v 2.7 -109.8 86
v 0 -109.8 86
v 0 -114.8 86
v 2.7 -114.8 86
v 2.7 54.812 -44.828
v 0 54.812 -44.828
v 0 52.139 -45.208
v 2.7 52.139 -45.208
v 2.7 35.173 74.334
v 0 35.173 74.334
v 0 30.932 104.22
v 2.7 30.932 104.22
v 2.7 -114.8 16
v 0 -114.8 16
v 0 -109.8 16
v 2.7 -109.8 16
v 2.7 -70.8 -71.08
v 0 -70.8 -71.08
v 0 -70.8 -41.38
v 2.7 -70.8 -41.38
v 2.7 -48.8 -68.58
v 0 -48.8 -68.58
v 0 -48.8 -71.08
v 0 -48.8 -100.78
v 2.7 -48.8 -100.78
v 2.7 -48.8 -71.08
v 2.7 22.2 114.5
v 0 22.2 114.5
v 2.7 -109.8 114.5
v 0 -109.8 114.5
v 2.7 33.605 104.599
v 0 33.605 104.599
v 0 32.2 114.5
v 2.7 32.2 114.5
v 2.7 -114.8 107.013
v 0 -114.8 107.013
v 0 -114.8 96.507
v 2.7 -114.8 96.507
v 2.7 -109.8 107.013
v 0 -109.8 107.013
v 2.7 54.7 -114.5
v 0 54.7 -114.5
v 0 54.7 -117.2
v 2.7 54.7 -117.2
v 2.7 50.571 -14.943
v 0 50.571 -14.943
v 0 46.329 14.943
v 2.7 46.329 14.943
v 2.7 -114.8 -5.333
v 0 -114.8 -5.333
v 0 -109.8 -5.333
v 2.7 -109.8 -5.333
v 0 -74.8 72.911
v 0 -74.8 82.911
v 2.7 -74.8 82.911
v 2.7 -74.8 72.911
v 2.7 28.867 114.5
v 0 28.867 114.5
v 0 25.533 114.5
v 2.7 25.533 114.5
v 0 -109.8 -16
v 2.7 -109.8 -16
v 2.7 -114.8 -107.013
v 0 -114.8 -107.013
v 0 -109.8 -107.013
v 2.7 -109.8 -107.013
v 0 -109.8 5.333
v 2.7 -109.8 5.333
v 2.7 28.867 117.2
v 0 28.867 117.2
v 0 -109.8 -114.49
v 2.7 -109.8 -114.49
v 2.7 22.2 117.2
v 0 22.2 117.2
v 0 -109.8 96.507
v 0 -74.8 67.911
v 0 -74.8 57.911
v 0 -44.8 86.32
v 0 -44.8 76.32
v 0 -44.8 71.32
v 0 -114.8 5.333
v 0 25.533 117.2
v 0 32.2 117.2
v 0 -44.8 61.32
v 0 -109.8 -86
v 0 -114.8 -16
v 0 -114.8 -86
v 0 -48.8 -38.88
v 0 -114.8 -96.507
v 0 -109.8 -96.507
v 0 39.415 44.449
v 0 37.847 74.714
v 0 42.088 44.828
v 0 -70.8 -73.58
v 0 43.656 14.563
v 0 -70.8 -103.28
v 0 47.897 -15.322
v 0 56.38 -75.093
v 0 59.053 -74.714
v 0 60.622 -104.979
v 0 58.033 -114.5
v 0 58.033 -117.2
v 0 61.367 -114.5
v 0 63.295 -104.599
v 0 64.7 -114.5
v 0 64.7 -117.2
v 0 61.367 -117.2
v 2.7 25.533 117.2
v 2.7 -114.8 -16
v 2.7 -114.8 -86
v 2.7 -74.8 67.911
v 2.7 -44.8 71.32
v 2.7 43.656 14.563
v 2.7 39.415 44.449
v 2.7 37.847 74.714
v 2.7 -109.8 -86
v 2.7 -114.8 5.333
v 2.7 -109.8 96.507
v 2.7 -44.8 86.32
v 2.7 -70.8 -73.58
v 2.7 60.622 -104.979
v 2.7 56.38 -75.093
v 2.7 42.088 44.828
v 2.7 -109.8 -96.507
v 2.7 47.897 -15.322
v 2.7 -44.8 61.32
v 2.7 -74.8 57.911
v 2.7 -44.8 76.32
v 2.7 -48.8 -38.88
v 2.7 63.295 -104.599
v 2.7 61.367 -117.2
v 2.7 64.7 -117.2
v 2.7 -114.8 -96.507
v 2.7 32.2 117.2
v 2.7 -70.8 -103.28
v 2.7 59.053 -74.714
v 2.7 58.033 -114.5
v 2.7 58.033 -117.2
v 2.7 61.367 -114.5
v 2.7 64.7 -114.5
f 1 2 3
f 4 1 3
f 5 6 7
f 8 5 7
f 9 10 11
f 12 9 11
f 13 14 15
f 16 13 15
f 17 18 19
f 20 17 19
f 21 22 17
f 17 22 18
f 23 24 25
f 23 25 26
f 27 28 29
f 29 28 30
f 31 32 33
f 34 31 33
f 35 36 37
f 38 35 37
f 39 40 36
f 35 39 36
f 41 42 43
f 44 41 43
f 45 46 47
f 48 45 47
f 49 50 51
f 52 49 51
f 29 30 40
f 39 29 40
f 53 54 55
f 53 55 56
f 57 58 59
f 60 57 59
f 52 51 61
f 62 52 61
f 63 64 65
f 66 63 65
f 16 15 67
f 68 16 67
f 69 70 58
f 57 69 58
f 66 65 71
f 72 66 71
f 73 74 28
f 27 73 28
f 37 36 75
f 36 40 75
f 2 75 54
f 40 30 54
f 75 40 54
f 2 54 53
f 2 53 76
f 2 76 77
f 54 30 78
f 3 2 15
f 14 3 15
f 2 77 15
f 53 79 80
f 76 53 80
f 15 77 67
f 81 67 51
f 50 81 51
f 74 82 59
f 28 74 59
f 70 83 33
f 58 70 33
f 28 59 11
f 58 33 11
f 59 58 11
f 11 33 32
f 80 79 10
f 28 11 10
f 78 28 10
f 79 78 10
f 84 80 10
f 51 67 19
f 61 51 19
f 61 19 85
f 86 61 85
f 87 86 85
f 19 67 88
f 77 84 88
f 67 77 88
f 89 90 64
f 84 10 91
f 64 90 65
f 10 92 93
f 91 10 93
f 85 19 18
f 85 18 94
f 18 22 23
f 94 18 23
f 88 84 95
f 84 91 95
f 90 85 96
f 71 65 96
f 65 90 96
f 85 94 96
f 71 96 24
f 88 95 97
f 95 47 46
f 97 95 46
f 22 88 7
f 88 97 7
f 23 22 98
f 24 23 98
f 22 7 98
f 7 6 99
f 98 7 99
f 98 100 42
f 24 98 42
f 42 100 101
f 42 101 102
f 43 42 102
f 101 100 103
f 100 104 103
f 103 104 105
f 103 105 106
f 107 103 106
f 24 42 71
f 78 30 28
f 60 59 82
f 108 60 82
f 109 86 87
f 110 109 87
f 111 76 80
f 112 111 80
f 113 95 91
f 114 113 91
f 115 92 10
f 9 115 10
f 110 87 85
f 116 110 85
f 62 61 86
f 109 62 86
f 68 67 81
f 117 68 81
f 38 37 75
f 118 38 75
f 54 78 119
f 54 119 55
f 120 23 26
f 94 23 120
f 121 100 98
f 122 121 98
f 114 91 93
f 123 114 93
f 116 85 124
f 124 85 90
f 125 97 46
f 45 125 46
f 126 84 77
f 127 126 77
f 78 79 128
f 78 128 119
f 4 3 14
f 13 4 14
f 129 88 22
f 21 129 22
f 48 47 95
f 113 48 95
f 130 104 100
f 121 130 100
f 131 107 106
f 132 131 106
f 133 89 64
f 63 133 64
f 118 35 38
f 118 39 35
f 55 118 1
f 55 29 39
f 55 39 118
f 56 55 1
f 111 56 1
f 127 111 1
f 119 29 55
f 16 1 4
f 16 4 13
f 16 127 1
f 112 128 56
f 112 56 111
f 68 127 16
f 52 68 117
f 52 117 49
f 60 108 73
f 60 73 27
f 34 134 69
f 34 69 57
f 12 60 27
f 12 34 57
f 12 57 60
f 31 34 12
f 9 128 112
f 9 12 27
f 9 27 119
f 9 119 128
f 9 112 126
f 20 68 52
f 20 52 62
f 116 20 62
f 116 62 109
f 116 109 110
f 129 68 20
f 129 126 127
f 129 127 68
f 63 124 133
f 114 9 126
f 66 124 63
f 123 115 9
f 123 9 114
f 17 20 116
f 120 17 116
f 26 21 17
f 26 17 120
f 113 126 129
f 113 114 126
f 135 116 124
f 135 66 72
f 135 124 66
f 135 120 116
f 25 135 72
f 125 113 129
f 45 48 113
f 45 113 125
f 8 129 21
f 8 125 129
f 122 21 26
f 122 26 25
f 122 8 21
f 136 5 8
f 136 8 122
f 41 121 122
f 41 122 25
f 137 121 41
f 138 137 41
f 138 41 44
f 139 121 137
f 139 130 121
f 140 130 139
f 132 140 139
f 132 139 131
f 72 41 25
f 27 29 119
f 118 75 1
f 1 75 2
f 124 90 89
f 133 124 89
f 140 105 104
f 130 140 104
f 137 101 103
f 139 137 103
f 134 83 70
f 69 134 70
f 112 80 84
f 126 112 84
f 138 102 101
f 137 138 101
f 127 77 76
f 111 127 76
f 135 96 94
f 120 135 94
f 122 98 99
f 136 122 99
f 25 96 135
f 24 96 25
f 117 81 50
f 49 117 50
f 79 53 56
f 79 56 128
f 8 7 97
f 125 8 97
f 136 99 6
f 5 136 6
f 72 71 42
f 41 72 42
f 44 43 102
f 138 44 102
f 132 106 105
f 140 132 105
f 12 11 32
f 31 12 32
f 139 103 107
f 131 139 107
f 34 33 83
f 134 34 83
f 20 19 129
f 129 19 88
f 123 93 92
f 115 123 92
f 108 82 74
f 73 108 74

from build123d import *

# Parameters (mm, degrees)
BOSS_EXTRUDE1_DEPTH = 2.7


with BuildPart() as part:
    # Sketch1 → Boss-Extrude1 (new body)
    with BuildSketch(Plane(origin=(0, 0, 0), x_dir=(0, 0, -1), z_dir=(1, 0, 0))):
        Polygon((-107.013333333, -114.8), (-96.506666667, -114.8), (-96.506666667, -109.8), (-86, -109.8), (-86, -114.8), (-16, -114.8), (-16, -109.8), (-5.333333333, -109.8), (-5.333333333, -114.8), (5.333333333, -114.8), (5.333333333, -109.8), (16, -109.8), (16, -114.8), (86, -114.8), (86, -109.8), (96.506666667, -109.8), (96.506666667, -114.8), (107.013333333, -114.8), (107.013333333, -109.8), (114.49, -109.8), (114.5, 54.7), (117.2, 54.7), (117.2, 58.033333333), (114.5, 58.033333333), (114.5, 61.366666667), (117.2, 61.366666667), (117.2, 64.7), (114.5, 64.7), (104.599212181, 63.294866357), (104.978598264, 60.621653646), (75.09310907, 56.380263258), (74.713722986, 59.05347597), (44.828233792, 54.812085582), (45.207619875, 52.138872871), (15.322130681, 47.897482483), (14.942744597, 50.570695194), (-14.942744597, 46.329304806), (-14.563358514, 43.656092095), (-44.448847708, 39.414701707), (-44.828233792, 42.087914418), (-74.713722986, 37.84652403), (-74.334336903, 35.173311319), (-104.219826097, 30.931920931), (-104.599212181, 33.605133643), (-114.5, 32.2), (-117.2, 32.2), (-117.2, 28.866666667), (-114.5, 28.866666667), (-114.5, 25.533333333), (-117.2, 25.533333333), (-117.2, 22.2), (-114.5, 22.2), (-114.5, -109.8), (-107.013333333, -109.8), align=None)
        Polygon((100.78, -48.8), (71.08, -48.8), (73.58, -70.8), (100.78, -70.8), (103.28, -70.8), align=None, mode=Mode.SUBTRACT)
        Polygon((68.58, -48.8), (71.08, -70.8), (41.38, -70.8), (38.88, -48.8), (41.38, -48.8), align=None, mode=Mode.SUBTRACT)
        Polygon((-72.910909091, -74.8), (-76.32, -44.8), (-86.32, -44.8), (-82.910909091, -74.8), align=None, mode=Mode.SUBTRACT)
        Polygon((-67.910909091, -74.8), (-71.32, -44.8), (-61.32, -44.8), (-57.910909091, -74.8), align=None, mode=Mode.SUBTRACT)
    extrude(amount=BOSS_EXTRUDE1_DEPTH)


solid = part.part
